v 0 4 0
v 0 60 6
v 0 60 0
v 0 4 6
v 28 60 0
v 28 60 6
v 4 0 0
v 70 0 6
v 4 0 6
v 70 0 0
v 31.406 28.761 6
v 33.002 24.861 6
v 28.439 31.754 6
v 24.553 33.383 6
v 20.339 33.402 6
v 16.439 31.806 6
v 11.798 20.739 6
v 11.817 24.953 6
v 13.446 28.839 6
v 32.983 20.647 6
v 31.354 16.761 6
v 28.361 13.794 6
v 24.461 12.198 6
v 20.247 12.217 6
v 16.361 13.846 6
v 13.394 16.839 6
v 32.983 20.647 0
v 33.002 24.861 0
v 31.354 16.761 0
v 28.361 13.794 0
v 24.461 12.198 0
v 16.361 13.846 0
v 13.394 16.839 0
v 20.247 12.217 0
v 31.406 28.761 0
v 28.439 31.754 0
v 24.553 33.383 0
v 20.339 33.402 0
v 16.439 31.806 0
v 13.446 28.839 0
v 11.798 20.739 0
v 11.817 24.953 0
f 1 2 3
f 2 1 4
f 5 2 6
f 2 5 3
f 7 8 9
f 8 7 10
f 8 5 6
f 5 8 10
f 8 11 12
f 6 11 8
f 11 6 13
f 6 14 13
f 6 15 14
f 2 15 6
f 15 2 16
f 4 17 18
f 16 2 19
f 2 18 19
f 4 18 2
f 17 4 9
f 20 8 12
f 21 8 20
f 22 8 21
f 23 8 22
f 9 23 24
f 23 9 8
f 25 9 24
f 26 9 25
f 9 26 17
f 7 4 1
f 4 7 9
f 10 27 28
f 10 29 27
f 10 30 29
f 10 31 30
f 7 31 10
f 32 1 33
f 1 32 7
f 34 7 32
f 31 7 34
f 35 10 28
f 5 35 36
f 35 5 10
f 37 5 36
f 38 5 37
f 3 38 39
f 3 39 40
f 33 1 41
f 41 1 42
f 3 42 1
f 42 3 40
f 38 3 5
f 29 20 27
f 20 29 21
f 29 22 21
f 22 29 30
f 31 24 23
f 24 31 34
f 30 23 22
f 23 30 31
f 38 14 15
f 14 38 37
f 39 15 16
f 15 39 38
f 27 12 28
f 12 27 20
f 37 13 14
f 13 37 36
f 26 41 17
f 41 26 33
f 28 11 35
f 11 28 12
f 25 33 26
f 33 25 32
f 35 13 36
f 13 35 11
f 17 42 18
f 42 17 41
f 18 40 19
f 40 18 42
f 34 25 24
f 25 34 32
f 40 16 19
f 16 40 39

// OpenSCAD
$fn = 32;

// ----------------------------------------------------------------------
// Bracket plate: gusset 70 x 60
// ----------------------------------------------------------------------

// --- parameters (mm) ---
hole_r = 3;               // bolt hole radius
plate_t = 6;              // plate thickness, Z (extrusion height)
gus_a = 70;               // base length
gus_b = 60;               // height
top_x = 28;               // top edge X of the angled cut
light_r = 10.8;           // lightening hole radius

light_d = 2 * light_r;

profile = [[4, 0], [35, 0], [70, 0], [28, 60], [0, 60], [0, 4]];  // primary outline, 6 points, counter clockwise
void_1 = [[33.002, 24.861], [31.406, 28.761], [28.439, 31.754], [24.553, 33.383], [20.339, 33.402], [16.439, 31.806], [13.446, 28.839], [11.817, 24.953], [11.798, 20.739], [13.394, 16.839], [16.361, 13.846], [20.247, 12.217], [24.461, 12.198], [28.361, 13.794], [31.354, 16.761], [32.983, 20.647]];  // lightening hole, 16 points

// --- the one profile operation ---
difference() {
  linear_extrude(height = plate_t) polygon(points = profile);
  translate([0, 0, -1])
    linear_extrude(height = plate_t + 2) polygon(points = void_1);
}
